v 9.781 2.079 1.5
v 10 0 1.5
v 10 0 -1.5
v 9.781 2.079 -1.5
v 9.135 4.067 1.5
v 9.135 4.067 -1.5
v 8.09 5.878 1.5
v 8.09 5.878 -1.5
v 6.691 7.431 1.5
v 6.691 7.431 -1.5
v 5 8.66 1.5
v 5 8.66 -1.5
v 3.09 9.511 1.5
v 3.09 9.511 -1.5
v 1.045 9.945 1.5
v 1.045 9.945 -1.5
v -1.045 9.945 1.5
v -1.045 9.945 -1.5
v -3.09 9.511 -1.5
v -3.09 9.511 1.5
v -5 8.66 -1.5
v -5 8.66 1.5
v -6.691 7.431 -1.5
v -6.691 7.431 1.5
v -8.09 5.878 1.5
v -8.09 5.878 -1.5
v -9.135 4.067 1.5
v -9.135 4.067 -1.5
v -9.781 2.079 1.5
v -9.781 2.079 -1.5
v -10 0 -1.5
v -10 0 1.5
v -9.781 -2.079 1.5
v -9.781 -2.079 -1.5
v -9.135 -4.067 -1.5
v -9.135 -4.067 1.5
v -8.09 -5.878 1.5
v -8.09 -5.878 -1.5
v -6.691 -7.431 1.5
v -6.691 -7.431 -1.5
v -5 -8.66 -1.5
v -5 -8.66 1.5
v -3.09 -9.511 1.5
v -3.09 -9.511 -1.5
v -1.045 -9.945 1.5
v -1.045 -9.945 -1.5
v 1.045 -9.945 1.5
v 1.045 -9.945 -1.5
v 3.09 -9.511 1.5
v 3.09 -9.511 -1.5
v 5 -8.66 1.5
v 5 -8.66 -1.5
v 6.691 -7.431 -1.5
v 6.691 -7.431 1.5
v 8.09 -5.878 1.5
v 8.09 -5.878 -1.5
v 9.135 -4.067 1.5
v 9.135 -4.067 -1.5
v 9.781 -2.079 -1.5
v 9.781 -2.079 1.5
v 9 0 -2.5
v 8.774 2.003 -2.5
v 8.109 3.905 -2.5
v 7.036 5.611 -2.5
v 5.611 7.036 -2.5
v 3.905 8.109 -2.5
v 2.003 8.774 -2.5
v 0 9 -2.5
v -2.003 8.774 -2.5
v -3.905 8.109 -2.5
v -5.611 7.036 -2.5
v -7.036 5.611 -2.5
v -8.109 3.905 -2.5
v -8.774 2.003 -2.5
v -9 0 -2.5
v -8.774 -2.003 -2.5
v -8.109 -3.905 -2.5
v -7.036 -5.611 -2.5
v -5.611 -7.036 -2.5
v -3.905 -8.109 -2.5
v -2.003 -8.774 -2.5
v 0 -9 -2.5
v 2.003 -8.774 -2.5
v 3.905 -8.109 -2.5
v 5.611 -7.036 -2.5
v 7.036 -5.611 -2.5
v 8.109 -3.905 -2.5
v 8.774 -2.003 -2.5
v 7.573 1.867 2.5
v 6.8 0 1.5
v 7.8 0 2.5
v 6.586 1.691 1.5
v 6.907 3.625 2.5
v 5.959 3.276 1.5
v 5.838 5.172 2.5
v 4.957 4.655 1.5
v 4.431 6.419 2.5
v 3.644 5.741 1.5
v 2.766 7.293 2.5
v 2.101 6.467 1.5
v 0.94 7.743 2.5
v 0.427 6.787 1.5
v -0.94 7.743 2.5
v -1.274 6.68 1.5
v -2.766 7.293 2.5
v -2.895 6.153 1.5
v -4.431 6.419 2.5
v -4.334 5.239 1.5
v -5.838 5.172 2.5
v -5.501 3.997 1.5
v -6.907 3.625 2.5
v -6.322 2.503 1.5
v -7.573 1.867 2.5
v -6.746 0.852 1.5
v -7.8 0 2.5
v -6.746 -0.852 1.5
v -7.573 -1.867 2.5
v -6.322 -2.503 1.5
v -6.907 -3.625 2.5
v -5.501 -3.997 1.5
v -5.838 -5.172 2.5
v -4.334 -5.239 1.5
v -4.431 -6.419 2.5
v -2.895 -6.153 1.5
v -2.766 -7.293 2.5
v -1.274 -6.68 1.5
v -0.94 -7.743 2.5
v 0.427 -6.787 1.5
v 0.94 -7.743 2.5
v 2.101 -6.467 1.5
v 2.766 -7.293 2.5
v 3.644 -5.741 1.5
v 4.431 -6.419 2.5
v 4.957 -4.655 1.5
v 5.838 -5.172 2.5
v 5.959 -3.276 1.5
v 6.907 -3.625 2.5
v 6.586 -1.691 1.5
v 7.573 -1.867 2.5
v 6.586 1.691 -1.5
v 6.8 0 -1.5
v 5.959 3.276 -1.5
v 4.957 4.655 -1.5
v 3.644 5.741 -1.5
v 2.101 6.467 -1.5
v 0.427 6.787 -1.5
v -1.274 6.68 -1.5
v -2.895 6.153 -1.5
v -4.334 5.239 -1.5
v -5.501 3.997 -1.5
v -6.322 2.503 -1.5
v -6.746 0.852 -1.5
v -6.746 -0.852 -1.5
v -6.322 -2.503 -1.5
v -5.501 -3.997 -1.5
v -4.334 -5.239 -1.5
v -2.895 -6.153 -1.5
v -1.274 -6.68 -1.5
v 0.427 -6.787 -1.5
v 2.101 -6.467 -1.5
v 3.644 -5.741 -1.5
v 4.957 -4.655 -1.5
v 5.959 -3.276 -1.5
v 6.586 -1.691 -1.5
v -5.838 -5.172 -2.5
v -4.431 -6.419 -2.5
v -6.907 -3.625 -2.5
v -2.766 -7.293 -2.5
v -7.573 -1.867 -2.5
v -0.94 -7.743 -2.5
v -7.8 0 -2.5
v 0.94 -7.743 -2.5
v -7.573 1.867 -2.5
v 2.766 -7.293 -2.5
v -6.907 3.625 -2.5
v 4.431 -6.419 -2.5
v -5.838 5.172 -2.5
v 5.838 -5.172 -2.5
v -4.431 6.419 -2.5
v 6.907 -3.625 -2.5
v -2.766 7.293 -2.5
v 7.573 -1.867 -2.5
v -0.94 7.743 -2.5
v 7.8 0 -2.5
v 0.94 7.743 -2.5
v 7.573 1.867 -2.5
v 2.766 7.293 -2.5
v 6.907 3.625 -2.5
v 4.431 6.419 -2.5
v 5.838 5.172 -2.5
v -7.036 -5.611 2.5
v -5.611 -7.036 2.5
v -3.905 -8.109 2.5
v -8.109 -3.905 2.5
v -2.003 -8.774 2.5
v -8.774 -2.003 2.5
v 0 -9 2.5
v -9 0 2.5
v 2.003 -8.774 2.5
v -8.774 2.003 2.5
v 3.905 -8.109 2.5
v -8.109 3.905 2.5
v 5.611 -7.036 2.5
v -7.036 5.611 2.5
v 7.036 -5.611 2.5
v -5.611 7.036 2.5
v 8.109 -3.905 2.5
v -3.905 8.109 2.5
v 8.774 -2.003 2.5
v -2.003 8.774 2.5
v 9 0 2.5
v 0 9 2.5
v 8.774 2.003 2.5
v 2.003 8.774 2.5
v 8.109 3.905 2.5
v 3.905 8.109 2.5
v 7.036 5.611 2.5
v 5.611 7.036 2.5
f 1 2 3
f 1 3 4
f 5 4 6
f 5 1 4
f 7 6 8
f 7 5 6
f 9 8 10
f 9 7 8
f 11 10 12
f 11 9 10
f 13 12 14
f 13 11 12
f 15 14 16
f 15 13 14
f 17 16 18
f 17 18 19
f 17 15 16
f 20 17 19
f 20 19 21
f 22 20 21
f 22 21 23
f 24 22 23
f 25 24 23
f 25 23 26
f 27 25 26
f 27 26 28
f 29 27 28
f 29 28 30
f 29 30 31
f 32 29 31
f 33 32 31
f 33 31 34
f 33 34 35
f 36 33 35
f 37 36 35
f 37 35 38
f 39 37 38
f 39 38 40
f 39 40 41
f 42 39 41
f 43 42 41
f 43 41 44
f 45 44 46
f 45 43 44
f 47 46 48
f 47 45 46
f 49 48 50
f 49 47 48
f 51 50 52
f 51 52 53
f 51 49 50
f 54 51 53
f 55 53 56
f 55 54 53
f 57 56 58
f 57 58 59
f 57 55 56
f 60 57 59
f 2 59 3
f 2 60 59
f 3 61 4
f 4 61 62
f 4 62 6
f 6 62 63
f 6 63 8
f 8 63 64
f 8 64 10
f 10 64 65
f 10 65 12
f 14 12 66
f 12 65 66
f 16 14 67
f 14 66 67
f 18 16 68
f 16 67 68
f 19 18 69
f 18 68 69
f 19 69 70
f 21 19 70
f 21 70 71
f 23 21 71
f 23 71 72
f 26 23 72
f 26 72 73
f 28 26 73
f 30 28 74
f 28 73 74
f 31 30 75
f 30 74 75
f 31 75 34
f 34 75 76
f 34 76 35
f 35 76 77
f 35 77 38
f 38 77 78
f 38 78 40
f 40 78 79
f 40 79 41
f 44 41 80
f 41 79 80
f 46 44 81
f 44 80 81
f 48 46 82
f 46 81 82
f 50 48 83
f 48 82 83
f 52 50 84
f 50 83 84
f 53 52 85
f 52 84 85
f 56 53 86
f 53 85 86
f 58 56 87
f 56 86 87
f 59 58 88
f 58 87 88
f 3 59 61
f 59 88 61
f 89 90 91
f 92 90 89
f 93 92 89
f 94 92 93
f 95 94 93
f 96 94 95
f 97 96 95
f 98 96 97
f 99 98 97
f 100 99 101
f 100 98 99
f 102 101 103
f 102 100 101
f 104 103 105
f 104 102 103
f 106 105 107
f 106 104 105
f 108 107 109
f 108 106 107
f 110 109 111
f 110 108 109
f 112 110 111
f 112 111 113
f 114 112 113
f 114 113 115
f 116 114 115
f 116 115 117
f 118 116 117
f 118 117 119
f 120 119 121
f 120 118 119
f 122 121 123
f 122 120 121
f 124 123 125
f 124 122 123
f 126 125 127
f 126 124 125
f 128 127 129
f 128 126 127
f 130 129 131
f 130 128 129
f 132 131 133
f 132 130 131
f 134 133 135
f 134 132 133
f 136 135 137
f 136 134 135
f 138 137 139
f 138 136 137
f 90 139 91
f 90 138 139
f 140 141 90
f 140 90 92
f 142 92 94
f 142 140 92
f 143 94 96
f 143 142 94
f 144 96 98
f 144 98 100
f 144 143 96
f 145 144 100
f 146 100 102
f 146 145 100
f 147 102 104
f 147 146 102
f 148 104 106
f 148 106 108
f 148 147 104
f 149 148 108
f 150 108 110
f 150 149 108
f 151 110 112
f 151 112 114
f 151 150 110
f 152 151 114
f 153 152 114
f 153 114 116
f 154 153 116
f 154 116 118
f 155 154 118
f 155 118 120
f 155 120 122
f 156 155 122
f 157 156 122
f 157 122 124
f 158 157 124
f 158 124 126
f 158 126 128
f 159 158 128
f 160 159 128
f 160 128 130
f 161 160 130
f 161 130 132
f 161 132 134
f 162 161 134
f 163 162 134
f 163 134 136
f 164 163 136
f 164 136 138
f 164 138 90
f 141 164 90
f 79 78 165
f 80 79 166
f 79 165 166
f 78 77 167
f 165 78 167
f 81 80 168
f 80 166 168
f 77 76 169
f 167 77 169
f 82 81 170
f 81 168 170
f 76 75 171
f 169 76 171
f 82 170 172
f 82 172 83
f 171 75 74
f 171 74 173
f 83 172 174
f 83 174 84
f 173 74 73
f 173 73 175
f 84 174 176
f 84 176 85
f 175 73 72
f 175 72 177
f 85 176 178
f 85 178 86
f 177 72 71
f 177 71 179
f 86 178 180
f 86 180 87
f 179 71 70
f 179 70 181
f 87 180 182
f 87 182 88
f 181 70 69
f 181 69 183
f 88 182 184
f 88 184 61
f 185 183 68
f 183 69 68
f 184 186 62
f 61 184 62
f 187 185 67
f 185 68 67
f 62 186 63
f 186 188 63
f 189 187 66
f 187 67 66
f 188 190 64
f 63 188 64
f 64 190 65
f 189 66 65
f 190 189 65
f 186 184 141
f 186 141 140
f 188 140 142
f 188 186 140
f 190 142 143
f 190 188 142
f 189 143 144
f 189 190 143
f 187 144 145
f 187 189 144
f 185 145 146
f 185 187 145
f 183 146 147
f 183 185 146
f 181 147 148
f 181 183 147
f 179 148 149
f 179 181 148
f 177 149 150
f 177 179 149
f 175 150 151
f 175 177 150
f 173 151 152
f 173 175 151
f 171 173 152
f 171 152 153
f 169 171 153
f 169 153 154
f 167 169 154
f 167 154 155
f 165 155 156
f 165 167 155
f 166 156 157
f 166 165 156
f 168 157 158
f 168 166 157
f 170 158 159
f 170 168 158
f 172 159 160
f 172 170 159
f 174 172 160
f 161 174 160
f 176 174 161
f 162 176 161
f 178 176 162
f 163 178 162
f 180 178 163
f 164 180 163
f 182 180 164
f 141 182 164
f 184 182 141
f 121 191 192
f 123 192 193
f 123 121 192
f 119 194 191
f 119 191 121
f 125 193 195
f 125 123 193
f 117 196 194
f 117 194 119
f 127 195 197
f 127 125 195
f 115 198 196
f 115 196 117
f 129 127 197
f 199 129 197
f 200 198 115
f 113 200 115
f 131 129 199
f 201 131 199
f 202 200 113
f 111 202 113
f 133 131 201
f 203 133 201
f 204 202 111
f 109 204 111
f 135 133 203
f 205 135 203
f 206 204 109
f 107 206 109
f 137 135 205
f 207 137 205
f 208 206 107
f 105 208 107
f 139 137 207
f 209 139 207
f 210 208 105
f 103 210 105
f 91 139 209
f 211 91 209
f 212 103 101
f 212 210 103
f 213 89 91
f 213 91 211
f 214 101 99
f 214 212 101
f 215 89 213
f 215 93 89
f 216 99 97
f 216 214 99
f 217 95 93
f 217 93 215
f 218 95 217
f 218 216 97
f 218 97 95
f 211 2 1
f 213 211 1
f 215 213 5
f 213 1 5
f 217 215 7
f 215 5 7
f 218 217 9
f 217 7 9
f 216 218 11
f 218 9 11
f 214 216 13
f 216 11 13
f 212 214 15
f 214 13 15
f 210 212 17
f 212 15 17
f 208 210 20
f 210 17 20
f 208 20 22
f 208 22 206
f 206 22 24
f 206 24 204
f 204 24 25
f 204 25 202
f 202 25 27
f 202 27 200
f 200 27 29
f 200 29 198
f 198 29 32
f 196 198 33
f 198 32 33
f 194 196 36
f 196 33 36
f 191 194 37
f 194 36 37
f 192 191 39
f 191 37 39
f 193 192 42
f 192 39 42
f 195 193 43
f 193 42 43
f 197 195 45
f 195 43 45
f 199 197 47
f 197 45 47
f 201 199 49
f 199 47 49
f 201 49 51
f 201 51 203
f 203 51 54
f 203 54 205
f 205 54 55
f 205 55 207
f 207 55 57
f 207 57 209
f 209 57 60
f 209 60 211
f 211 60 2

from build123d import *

# Parameters (mm, degrees)
SKETCH1_R               = 10
SKETCH1_R_2             = 7
MAIN_BODY_EXTRUDE_DEPTH = 2.5
F_2_OFFSET_BY           = 0.2
CHAMFER1_SIZE           = 1


with BuildPart() as part:
    # Sketch1 → Main Body Extrude (new, symmetric)
    with BuildSketch(Plane.XY):
        Circle(SKETCH1_R)
        Circle(SKETCH1_R_2, mode=Mode.SUBTRACT)
    extrude(amount=MAIN_BODY_EXTRUDE_DEPTH, both=True)

    # .2 Offset: a curved face moved outward by 0.2
    add(Solid.thicken(part.faces().sort_by_distance((-7, 0, 0))[0], F_2_OFFSET_BY))

    # Chamfer1
    chamfer1_edges = [part.edges().sort_by_distance(p)[0] for p in [
        (-10, 0, 2.5),
        (-10, 0, -2.5),
        (-6.8, 0, -2.5),
        (-6.8, 0, 2.5),
    ]]
    chamfer(chamfer1_edges, length=CHAMFER1_SIZE)


solid = part.part
